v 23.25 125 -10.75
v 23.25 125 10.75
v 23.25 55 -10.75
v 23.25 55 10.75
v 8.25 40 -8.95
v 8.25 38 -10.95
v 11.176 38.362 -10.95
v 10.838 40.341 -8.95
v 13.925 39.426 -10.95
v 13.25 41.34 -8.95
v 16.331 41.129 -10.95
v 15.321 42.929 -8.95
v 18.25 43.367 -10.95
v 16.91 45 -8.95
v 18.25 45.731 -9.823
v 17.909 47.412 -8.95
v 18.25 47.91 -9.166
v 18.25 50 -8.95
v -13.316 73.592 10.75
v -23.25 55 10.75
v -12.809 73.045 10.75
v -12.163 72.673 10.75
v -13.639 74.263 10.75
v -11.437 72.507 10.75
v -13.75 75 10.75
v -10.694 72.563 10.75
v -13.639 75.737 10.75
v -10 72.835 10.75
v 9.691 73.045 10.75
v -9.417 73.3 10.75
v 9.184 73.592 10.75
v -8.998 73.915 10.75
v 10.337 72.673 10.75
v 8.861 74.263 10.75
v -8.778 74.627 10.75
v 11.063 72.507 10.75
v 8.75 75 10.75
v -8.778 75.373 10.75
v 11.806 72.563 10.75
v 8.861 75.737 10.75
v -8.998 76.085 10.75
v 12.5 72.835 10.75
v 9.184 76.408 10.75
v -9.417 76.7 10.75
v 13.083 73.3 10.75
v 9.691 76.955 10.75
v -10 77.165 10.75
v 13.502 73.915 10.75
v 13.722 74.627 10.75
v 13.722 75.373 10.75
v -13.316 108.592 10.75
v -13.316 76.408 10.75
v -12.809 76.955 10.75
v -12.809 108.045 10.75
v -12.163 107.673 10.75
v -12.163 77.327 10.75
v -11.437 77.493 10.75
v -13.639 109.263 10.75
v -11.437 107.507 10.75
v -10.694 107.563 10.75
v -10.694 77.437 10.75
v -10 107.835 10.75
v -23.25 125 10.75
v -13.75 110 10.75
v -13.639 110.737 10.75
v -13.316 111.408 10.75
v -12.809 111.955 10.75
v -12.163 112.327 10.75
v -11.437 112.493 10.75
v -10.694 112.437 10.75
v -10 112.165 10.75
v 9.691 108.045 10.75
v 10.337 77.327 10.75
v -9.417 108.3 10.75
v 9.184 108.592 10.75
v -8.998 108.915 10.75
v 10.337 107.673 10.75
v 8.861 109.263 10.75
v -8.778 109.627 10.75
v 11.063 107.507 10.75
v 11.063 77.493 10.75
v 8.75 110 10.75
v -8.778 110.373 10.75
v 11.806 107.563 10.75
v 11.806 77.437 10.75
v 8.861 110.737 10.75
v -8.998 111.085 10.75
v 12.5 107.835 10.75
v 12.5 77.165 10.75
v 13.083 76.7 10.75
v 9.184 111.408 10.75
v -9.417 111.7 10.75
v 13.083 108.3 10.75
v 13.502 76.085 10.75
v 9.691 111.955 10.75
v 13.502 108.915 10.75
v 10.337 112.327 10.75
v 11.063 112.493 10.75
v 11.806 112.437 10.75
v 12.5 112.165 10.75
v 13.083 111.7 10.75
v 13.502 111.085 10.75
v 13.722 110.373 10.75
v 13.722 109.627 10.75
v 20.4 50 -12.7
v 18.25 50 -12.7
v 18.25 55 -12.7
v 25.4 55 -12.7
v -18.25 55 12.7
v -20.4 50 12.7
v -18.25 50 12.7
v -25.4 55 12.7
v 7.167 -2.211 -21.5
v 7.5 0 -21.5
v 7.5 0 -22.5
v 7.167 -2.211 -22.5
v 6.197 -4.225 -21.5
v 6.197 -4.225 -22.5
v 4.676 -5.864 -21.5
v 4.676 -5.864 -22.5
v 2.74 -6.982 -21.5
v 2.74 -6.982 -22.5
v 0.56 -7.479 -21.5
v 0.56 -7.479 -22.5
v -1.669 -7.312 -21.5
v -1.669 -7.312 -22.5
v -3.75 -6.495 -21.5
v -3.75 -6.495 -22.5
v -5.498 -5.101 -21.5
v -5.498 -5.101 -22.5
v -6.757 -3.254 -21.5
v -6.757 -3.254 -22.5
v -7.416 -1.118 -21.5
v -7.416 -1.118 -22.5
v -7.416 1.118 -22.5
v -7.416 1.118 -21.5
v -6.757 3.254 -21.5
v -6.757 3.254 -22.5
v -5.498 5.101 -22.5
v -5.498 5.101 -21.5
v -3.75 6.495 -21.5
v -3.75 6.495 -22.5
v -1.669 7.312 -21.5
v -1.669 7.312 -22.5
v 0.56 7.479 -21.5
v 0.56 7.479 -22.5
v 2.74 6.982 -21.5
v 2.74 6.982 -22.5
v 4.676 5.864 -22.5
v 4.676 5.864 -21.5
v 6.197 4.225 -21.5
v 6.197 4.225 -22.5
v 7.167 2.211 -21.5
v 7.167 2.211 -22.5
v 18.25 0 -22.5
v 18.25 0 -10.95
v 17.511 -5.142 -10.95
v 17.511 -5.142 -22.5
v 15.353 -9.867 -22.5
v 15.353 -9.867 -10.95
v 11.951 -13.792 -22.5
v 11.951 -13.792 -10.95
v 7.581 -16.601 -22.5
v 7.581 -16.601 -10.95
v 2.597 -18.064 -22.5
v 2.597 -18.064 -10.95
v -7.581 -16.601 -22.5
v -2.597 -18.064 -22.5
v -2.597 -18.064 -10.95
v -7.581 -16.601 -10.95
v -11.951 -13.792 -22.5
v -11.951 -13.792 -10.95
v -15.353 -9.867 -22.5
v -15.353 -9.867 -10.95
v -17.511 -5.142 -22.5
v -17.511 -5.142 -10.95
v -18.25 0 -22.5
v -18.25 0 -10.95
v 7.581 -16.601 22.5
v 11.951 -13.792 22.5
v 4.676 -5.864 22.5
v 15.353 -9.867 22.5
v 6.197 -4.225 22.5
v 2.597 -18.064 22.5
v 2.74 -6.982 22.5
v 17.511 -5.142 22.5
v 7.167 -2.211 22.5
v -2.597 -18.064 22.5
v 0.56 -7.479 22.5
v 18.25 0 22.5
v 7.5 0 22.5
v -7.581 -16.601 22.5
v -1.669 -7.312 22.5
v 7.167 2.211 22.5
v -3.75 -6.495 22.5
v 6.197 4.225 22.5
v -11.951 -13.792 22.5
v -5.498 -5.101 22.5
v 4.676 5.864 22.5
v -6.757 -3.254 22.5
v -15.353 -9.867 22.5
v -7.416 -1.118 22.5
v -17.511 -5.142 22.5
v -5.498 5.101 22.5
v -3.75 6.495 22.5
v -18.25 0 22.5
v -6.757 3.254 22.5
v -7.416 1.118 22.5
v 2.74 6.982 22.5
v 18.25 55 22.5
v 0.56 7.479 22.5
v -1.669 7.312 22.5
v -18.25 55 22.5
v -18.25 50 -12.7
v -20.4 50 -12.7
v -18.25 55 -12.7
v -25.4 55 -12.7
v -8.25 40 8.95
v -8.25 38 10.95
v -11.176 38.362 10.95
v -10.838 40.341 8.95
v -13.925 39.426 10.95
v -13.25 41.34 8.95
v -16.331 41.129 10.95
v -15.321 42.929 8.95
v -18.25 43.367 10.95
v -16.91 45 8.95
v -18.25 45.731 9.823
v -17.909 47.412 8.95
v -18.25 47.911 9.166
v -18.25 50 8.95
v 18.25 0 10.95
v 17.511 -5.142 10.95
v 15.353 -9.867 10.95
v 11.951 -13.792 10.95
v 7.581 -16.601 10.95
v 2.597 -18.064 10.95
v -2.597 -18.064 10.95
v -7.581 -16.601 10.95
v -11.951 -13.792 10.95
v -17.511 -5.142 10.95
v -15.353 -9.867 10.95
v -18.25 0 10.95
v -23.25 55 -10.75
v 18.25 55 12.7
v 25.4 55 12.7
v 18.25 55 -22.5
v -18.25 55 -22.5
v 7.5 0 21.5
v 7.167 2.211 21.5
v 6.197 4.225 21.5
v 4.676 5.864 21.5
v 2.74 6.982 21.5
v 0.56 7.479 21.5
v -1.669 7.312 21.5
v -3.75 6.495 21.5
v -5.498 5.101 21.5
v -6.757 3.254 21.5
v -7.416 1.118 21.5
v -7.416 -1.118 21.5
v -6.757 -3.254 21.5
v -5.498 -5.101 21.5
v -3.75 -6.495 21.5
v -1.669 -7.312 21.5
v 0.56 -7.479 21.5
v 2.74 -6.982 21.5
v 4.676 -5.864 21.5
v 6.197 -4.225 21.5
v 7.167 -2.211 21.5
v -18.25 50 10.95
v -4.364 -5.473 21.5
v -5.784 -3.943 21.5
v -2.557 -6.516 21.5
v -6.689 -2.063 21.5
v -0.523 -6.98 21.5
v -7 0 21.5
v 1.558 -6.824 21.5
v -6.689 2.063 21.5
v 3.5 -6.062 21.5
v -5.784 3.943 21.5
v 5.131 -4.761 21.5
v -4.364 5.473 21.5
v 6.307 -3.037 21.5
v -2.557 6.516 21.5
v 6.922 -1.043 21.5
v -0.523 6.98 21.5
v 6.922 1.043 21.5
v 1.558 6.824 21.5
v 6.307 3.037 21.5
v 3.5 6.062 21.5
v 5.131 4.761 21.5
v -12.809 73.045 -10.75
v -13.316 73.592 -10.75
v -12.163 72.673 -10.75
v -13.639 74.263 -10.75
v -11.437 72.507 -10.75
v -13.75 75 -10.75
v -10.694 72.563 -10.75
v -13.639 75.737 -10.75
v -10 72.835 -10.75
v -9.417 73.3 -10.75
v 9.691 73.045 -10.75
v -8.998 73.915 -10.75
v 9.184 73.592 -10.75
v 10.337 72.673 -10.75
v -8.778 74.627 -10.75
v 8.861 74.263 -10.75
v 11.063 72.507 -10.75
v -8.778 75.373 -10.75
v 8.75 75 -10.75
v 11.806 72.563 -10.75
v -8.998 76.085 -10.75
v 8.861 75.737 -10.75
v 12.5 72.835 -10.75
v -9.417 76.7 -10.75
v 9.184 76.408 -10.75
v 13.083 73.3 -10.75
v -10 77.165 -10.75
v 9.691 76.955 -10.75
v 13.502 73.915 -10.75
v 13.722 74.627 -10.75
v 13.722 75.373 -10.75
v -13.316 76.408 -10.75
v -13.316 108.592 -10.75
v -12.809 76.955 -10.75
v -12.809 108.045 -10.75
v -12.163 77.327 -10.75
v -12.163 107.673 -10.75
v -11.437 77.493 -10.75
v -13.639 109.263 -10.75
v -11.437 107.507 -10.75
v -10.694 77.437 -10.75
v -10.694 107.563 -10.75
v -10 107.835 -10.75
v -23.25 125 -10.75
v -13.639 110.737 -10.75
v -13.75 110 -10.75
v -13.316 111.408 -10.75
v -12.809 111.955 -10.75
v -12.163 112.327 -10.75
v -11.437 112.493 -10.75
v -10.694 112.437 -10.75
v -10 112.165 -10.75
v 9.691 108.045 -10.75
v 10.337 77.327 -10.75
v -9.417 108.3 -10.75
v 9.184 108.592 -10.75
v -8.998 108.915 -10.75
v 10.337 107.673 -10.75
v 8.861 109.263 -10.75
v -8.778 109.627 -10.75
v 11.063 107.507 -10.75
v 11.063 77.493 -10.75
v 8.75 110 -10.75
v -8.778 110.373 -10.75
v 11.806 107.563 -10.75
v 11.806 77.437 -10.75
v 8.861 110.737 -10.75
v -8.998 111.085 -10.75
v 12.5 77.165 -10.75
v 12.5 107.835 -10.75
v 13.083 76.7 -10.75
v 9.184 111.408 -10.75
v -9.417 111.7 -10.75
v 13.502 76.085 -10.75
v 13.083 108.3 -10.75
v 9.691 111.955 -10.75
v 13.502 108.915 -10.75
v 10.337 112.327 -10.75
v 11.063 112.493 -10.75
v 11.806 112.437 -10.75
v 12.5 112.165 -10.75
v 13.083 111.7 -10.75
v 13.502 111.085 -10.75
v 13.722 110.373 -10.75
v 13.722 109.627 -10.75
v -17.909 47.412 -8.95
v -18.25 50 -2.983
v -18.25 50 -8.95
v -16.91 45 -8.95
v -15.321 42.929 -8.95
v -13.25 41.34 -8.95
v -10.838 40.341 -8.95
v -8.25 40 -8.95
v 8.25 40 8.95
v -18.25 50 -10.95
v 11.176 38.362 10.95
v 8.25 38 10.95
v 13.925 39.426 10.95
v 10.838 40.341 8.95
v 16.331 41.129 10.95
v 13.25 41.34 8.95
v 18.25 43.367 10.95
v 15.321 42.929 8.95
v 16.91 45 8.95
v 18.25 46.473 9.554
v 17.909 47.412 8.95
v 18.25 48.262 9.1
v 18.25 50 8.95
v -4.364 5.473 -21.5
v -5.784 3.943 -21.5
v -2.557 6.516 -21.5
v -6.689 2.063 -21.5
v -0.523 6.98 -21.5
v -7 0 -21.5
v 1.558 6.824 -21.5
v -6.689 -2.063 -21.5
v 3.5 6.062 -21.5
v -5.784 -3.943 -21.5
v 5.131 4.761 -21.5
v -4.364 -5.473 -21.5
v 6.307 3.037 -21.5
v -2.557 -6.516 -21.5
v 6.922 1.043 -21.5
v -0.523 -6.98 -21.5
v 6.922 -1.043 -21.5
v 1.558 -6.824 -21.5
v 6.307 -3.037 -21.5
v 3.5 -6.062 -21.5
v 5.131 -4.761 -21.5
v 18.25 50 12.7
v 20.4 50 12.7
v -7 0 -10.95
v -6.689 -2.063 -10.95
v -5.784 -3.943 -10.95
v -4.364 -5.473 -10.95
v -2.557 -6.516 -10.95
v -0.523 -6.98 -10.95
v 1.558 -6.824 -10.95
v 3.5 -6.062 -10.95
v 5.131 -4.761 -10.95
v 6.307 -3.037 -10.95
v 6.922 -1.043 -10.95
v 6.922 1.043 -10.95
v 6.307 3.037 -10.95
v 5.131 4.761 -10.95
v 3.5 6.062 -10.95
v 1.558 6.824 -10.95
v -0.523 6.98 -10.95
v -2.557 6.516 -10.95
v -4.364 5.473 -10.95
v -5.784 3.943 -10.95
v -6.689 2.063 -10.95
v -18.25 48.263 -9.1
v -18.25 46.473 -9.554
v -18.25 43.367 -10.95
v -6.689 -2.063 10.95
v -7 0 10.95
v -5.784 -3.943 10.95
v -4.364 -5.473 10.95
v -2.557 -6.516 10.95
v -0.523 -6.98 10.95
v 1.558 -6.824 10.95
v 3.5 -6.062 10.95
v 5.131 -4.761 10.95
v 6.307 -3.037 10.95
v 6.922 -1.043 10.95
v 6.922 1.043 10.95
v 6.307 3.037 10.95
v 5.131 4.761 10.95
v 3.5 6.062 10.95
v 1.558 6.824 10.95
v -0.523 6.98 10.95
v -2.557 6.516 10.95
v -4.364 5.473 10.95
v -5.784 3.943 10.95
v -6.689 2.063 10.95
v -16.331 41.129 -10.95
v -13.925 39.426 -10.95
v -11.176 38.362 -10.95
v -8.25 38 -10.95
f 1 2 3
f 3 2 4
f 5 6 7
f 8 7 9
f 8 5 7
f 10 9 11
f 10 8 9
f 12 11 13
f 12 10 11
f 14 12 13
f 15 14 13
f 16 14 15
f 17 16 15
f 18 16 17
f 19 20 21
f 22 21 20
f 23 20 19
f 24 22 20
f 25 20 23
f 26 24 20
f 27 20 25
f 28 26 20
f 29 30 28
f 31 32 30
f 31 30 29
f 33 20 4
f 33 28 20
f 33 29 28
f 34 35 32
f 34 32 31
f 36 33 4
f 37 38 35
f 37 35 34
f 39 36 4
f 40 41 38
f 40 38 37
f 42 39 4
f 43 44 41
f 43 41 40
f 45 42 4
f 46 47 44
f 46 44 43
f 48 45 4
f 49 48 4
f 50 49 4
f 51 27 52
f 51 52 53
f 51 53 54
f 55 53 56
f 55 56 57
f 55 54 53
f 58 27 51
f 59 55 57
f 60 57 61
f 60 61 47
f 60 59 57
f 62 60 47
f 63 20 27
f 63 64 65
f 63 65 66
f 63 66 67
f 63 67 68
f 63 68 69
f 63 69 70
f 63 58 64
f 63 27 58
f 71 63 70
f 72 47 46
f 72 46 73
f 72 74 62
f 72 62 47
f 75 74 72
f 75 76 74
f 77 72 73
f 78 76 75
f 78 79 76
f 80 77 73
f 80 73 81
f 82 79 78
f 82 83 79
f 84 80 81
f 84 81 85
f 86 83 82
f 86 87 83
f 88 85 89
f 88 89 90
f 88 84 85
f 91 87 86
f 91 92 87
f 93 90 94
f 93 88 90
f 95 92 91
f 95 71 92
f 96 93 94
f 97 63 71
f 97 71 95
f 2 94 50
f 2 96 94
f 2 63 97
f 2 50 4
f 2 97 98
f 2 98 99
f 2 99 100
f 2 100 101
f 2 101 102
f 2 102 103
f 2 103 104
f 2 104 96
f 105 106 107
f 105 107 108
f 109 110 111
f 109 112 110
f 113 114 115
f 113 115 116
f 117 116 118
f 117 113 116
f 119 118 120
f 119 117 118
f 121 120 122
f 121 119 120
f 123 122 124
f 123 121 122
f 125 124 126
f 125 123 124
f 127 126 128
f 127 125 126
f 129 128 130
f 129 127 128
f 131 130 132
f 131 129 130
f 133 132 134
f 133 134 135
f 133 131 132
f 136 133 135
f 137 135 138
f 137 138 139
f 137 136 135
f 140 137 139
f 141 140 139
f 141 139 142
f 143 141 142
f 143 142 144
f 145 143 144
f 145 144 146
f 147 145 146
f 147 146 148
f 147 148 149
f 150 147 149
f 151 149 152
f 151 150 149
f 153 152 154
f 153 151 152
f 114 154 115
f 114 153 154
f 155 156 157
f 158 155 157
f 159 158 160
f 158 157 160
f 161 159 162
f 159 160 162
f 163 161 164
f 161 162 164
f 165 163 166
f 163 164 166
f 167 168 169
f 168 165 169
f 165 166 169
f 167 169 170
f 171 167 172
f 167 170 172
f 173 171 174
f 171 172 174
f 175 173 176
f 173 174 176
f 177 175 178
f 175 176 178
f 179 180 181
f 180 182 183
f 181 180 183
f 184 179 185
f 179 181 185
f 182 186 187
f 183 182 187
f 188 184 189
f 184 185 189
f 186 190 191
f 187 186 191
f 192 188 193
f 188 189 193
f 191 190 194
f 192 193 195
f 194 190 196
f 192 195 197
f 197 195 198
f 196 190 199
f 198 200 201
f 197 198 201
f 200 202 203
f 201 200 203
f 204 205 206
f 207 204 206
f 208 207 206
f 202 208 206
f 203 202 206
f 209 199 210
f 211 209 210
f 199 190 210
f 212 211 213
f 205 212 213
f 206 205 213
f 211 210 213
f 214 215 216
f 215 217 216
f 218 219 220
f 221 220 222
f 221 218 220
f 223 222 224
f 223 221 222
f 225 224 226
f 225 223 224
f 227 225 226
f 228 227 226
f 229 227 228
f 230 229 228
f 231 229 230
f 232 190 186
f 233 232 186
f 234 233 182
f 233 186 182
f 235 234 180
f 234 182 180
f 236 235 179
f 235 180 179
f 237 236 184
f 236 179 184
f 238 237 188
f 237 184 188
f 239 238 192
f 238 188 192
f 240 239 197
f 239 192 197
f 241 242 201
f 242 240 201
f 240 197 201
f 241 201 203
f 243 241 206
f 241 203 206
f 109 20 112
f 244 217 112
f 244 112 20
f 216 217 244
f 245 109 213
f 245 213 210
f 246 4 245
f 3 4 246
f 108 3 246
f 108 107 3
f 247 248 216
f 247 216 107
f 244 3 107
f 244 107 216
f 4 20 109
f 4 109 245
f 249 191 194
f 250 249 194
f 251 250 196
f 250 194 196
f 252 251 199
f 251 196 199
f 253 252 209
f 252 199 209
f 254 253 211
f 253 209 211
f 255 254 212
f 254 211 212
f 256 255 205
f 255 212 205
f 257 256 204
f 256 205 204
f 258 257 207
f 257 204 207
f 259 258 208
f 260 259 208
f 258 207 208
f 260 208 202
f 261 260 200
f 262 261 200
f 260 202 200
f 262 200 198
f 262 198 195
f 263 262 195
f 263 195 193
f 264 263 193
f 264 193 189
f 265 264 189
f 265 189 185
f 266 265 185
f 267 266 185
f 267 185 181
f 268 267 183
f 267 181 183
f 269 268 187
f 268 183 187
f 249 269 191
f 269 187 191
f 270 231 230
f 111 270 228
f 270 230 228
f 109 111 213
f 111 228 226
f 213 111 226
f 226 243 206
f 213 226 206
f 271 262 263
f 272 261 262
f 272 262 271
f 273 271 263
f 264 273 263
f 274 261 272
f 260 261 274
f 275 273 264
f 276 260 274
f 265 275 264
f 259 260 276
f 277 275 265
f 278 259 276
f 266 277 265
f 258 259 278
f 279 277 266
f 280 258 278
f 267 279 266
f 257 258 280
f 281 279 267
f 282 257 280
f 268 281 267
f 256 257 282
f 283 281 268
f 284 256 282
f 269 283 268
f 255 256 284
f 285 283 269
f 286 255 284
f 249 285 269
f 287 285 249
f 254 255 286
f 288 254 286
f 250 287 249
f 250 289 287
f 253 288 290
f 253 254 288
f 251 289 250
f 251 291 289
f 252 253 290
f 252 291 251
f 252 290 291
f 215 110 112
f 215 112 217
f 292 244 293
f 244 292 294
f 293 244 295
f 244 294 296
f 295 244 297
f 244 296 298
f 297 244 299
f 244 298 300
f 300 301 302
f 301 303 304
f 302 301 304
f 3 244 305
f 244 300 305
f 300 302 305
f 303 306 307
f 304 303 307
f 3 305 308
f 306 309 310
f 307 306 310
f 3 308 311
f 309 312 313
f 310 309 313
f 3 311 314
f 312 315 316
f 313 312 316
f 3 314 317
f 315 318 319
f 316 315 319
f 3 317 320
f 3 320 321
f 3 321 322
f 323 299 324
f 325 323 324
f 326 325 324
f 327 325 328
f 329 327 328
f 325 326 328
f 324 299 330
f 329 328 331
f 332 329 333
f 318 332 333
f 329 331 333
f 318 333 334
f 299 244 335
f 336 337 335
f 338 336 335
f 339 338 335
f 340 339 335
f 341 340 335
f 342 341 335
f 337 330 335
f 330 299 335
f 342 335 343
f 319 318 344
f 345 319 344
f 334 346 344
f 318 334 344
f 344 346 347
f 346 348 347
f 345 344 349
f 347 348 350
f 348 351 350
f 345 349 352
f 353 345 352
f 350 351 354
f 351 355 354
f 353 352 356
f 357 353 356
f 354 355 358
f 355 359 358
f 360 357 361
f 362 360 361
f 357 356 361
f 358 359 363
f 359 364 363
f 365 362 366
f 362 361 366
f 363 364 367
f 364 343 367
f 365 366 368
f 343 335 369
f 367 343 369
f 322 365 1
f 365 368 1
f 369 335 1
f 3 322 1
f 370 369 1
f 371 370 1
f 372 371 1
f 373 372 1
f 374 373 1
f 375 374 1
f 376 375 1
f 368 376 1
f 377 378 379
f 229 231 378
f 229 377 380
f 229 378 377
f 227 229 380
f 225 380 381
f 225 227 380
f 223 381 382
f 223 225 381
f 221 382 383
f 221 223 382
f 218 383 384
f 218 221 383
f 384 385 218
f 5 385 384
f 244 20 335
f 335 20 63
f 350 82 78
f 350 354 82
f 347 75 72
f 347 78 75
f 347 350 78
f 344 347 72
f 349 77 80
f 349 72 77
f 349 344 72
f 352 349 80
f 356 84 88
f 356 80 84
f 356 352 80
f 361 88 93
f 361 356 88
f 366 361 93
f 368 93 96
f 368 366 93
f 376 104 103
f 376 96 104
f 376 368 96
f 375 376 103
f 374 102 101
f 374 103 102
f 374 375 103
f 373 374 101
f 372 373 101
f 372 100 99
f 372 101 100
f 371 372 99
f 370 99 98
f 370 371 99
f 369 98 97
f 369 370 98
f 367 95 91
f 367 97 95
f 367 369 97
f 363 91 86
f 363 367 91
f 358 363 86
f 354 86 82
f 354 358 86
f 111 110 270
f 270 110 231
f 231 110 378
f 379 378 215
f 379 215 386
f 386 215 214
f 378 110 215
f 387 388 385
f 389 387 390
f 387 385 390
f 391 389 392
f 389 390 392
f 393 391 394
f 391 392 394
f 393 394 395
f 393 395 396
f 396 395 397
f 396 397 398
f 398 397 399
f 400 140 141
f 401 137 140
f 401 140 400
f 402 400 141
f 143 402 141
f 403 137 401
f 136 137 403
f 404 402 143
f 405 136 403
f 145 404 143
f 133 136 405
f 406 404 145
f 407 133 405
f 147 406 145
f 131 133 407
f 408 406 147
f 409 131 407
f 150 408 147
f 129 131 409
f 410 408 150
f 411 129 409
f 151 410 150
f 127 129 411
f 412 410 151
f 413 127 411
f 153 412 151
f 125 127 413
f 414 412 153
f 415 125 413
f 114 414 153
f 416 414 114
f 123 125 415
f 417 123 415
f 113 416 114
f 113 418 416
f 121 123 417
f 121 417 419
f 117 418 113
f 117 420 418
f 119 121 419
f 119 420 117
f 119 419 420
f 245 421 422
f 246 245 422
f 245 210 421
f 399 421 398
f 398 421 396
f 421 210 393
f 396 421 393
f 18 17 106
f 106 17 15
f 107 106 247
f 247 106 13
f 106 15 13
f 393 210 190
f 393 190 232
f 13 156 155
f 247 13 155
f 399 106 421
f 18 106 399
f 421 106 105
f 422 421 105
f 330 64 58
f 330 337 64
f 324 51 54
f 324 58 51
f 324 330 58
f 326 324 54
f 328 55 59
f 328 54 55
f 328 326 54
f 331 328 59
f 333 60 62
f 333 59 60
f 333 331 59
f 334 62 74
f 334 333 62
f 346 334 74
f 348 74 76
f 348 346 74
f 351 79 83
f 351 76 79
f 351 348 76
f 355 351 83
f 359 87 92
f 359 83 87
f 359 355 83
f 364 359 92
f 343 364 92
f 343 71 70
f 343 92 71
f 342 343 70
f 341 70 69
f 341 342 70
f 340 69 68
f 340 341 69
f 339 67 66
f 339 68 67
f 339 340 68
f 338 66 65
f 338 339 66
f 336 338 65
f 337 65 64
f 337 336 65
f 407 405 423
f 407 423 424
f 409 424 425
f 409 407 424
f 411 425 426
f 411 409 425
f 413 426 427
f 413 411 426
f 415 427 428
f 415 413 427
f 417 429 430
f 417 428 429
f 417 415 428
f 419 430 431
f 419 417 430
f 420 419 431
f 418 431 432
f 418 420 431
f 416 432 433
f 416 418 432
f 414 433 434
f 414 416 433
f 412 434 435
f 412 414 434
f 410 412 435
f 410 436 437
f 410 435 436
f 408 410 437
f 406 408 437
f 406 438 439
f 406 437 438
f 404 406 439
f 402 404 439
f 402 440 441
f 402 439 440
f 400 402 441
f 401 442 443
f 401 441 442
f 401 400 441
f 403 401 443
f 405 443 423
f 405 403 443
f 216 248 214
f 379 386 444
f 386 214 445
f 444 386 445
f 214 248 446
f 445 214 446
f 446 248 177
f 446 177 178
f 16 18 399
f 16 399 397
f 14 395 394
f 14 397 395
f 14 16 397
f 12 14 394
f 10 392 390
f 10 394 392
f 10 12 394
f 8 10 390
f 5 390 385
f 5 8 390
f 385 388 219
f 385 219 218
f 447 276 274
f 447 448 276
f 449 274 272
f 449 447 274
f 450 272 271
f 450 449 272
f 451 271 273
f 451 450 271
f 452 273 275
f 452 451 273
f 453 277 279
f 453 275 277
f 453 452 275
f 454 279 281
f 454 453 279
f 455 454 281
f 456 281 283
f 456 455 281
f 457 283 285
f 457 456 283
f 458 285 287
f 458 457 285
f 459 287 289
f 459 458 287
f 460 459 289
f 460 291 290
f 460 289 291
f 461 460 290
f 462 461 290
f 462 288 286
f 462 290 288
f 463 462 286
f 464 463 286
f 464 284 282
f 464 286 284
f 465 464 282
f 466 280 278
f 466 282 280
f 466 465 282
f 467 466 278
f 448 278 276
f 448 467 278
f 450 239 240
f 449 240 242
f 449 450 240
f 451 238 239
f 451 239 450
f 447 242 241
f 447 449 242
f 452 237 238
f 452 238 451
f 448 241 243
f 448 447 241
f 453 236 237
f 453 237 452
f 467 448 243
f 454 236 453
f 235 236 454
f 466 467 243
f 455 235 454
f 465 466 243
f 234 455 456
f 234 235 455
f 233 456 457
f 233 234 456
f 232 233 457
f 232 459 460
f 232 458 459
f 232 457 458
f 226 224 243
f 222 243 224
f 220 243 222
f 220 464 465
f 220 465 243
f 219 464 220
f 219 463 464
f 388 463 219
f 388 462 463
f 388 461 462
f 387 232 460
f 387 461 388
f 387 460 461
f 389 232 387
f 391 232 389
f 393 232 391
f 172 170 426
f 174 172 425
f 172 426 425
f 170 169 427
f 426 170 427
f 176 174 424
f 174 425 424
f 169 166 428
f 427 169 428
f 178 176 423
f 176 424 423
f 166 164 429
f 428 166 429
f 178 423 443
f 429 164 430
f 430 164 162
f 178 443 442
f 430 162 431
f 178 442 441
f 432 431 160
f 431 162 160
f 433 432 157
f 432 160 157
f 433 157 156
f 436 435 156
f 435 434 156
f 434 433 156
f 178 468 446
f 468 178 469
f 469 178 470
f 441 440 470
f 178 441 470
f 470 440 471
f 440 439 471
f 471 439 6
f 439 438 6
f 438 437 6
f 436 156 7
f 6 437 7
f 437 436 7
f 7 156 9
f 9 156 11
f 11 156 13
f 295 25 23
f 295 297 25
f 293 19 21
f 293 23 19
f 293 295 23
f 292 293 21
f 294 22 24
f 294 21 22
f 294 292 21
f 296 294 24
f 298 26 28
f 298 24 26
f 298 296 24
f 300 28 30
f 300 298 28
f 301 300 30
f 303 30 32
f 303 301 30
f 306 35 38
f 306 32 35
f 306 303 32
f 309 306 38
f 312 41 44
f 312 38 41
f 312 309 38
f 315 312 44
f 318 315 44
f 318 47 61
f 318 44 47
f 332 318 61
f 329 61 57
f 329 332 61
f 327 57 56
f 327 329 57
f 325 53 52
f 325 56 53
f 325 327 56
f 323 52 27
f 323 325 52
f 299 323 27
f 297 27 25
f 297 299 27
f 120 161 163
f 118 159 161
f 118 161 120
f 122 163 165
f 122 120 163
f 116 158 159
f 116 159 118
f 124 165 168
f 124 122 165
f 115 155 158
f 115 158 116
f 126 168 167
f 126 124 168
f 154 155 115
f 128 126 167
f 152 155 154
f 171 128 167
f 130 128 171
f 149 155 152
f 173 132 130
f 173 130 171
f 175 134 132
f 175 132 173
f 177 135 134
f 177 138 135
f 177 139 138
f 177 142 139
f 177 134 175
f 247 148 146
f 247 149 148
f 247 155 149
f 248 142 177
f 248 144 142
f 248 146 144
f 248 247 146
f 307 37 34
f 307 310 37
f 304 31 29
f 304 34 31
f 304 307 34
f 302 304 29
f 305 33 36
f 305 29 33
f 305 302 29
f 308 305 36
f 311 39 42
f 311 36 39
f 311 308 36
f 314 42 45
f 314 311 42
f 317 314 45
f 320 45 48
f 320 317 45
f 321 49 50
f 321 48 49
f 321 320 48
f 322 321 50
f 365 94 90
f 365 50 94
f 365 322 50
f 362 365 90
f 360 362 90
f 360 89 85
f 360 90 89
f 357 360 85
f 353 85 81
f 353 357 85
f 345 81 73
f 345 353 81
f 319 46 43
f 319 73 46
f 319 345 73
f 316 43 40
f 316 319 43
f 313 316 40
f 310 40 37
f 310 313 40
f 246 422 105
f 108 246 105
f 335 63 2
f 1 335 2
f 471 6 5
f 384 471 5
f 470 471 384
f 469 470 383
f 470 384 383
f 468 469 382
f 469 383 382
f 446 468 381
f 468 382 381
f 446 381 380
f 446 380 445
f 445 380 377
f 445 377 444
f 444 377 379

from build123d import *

# Parameters (mm, degrees)
SKETCH1_R           = 7
SKETCH1_R_2         = 2.5
BOSS_EXTRUDE1_DEPTH = 22.5
SKETCH2_W           = 21.9
SKETCH2_H           = 63.25
CUT_EXTRUDE1_DEPTH  = 136.25346576
SKETCH3_R           = 7.5
CUT_EXTRUDE2_DEPTH  = 1
CUT_EXTRUDE3_START  = -1
SKETCH4_R           = 7.5
CUT_EXTRUDE3_DEPTH  = 1
SKETCH5_W           = 9.8
SKETCH5_H           = 70
CUT_EXTRUDE4_DEPTH  = 136.25346576
CUT_EXTRUDE5_DEPTH  = 135.872393395
CUT_EXTRUDE6_REACH  = 148.858
SKETCH8_W           = 46.5
SKETCH8_H           = 1.95
SKETCH9_W           = 50.8
SKETCH9_H           = 25.4
BOSS_EXTRUDE2_DEPTH = 5
FILLET1_R           = 10
CHAMFER1_SIZE       = 5
CHAMFER2_SIZE       = 2


# Some blends are built 0.0001 mm under size
with BuildPart() as part:
    # Sketch1 → Boss-Extrude1 (new, symmetric)
    with BuildSketch(Plane.XY):
        with BuildLine():
            Line((-23.25, 0), (-23.25, 125))
            Line((-23.25, 125), (23.25, 125))
            Line((23.25, 125), (23.25, 0))
            ThreePointArc((23.25, 0), (0, -23.25), (-23.25, 0))
        make_face()
        with Locations(Location((0, 0, 0), (0, 0, 180))):
            Circle(SKETCH1_R, mode=Mode.SUBTRACT)
        with Locations(Location((-11.25, 110, 0), (0, 0, 180))):
            Circle(SKETCH1_R_2, mode=Mode.SUBTRACT)
        with Locations(Location((11.25, 110, 0), (0, 0, 180))):
            Circle(SKETCH1_R_2, mode=Mode.SUBTRACT)
        with Locations(Location((11.25, 75, 0), (0, 0, 180))):
            Circle(SKETCH1_R_2, mode=Mode.SUBTRACT)
        with Locations(Location((-11.25, 75, 0), (0, 0, 180))):
            Circle(SKETCH1_R_2, mode=Mode.SUBTRACT)
    extrude(amount=BOSS_EXTRUDE1_DEPTH, both=True)

    # Sketch2 → Cut-Extrude1 (cut, through all)
    with BuildSketch(Plane(origin=(23.25, 0, 0), x_dir=(0, 0, -1), z_dir=(1, 0, 0))):
        with Locations((0, 8.375)):
            Rectangle(SKETCH2_W, SKETCH2_H)
    extrude(amount=-CUT_EXTRUDE1_DEPTH, mode=Mode.SUBTRACT)

    # Sketch3 → Cut-Extrude2 (cut)
    with BuildSketch(Plane.XY.offset(22.5)):
        Circle(SKETCH3_R)
    extrude(amount=-CUT_EXTRUDE2_DEPTH, mode=Mode.SUBTRACT)

    # Sketch4 → Cut-Extrude3 (cut)
    with BuildSketch(Plane(origin=(0, 0, -22.5), x_dir=(-1, 0, 0), z_dir=(0, 0, -1)).offset(CUT_EXTRUDE3_START)):
        with Locations(Location((0, 0, 0), (0, 0, 180))):
            Circle(SKETCH4_R)
    extrude(amount=CUT_EXTRUDE3_DEPTH, mode=Mode.SUBTRACT)

    # Sketch5 → Cut-Extrude4 (cut, through all)
    with BuildSketch(Plane(origin=(23.25, 0, 0), x_dir=(0, 0, -1), z_dir=(1, 0, 0))):
        with Locations((-17.6, 90)):
            Rectangle(SKETCH5_W, SKETCH5_H)
        with Locations((17.6, 90)):
            Rectangle(SKETCH5_W, SKETCH5_H)
    extrude(amount=-CUT_EXTRUDE4_DEPTH, mode=Mode.SUBTRACT)

    # Sketch6 → Cut-Extrude5 (cut, through all)
    with BuildSketch(Plane.XY.offset(22.5)):
        with BuildLine():
            Line((-18.25, 0), (-18.25, 55))
            Line((-18.25, 55), (-23.25, 55))
            Line((-23.25, 55), (-23.25, -23.25))
            Line((-23.25, -23.25), (23.25, -23.25))
            Line((23.25, -23.25), (23.25, 55))
            Line((23.25, 55), (18.25, 55))
            Line((18.25, 55), (18.25, 0))
            ThreePointArc((18.25, 0), (0, -18.25), (-18.25, 0))
        make_face()
    extrude(amount=-CUT_EXTRUDE5_DEPTH, mode=Mode.SUBTRACT)

    # Cut-Extrude6: up to this face of the body (flat: up to its plane)
    cut_extrude6_end = Plane(part.part.faces().sort_by_distance((0, 55, -17.6))[0])
    # Sketch8 → Cut-Extrude6 (cut, up to the picked face)
    with BuildSketch(Plane(origin=(0, 125, 0), x_dir=(1, 0, 0), z_dir=(0, 1, 0)), mode=Mode.PRIVATE) as cut_extrude6_sk1:
        with Locations((0, 11.725)):
            Rectangle(SKETCH8_W, SKETCH8_H)
    cut_extrude6_tool1 = split(extrude(cut_extrude6_sk1.sketch, amount=-CUT_EXTRUDE6_REACH, mode=Mode.PRIVATE), bisect_by=cut_extrude6_end, keep=Keep.BOTH, mode=Mode.PRIVATE)
    # Sketch8 → Cut-Extrude6 (cut, up to the picked face)
    with BuildSketch(Plane(origin=(0, 125, 0), x_dir=(1, 0, 0), z_dir=(0, 1, 0)), mode=Mode.PRIVATE) as cut_extrude6_sk2:
        with Locations((0, -11.725)):
            Rectangle(SKETCH8_W, SKETCH8_H)
    cut_extrude6_tool2 = split(extrude(cut_extrude6_sk2.sketch, amount=-CUT_EXTRUDE6_REACH, mode=Mode.PRIVATE), bisect_by=cut_extrude6_end, keep=Keep.BOTH, mode=Mode.PRIVATE)
    add(cut_extrude6_tool1.solids().sort_by(Axis((0, 125, -11.725), (0, -1, 0)))[0], mode=Mode.SUBTRACT)
    add(cut_extrude6_tool2.solids().sort_by(Axis((0, 125, 11.725), (0, -1, 0)))[0], mode=Mode.SUBTRACT)

    # Sketch9 → Boss-Extrude2 (add)
    with BuildSketch(Plane(origin=(0, 55, 0), x_dir=(1, 0, 0), z_dir=(0, 1, 0))):
        Rectangle(SKETCH9_W, SKETCH9_H)
    extrude(amount=-BOSS_EXTRUDE2_DEPTH)

    # Fillet1
    fillet1_edges = [part.edges().sort_by_distance(p)[0] for p in [
        (18.25, 40, 0),
        (-18.25, 40, 0),
    ]]
    fillet(fillet1_edges, radius=FILLET1_R - 0.0001)  # a hair under: the kernel refuses the full size

    # Chamfer1
    chamfer1_edges = [part.edges().sort_by_distance(p)[0] for p in [
        (-25.4, 50, 0),
        (25.4, 50, 0),
    ]]
    chamfer(chamfer1_edges, length=CHAMFER1_SIZE - 0.0001)  # a hair under: the kernel refuses the full size

    # Chamfer2
    # the kernel refuses this chamfer: 2 mm, written as the material it adds along each edge
    with BuildSketch(Plane(origin=(8.2501, 40, -10.95), x_dir=(0, -0.9996219169112968, -0.02749587661058651), z_dir=(-1, 0, 0))) as chamfer2_piece_1:
        Polygon((CHAMFER2_SIZE * 0.999621916911, CHAMFER2_SIZE * 0.0274958766106), (-CHAMFER2_SIZE * 0.0274958766106, CHAMFER2_SIZE * 0.999621916911), (0, 0), align=None)
    extrude(amount=16.5002)
    with BuildSketch(Plane(origin=(8.2501, 40, 10.95), x_dir=(0, -0.9996219169112968, 0.02749587661058651), z_dir=(-1, 0, 0))) as chamfer2_piece_2:
        Polygon((CHAMFER2_SIZE * 0.999621916911, -CHAMFER2_SIZE * 0.0274958766106), (-CHAMFER2_SIZE * 0.0274958766106, -CHAMFER2_SIZE * 0.999621916911), (0, 0), align=None)
    extrude(amount=16.5002)
    with BuildSketch(Plane(origin=(8.2501, 49.9999, 10.95), x_dir=(0, -1, 0), z_dir=(-1, 0, 0))) as chamfer2_piece_3_section:
        Polygon((9.9999 + CHAMFER2_SIZE, 0), (9.9999, -CHAMFER2_SIZE), (9.9999, 0), align=None)
    chamfer2_piece_3 = revolve(axis=Axis((8.2501, 49.9999, 10.95), (0, 0, 1)), revolution_arc=119.48144917, mode=Mode.PRIVATE)
    chamfer2_piece_3 = split(chamfer2_piece_3, bisect_by=Plane(origin=(18.25, 39.233435125, 10.852733076), z_dir=(-1, 0, 0)), keep=Keep.TOP, mode=Mode.PRIVATE)
    chamfer2_piece_3 = split(chamfer2_piece_3, bisect_by=Plane(origin=(10.698789492, 50, 10.852733076), z_dir=(0, -1, 0)), keep=Keep.TOP, mode=Mode.PRIVATE)
    add(chamfer2_piece_3)
    with BuildSketch(Plane(origin=(8.2501, 49.9999, -10.95), x_dir=(0, -1, 0), z_dir=(-1, 0, 0))) as chamfer2_piece_4_section:
        Polygon((9.9999 + CHAMFER2_SIZE, 0), (9.9999, CHAMFER2_SIZE), (9.9999, 0), align=None)
    chamfer2_piece_4 = revolve(axis=Axis((8.2501, 49.9999, -10.95), (0, 0, 1)), revolution_arc=119.48144917, mode=Mode.PRIVATE)
    chamfer2_piece_4 = split(chamfer2_piece_4, bisect_by=Plane(origin=(18.25, 39.233435125, -10.852733076), z_dir=(-1, 0, 0)), keep=Keep.TOP, mode=Mode.PRIVATE)
    chamfer2_piece_4 = split(chamfer2_piece_4, bisect_by=Plane(origin=(10.698789492, 50, -10.852733076), z_dir=(0, -1, 0)), keep=Keep.TOP, mode=Mode.PRIVATE)
    add(chamfer2_piece_4)
    with BuildSketch(Plane(origin=(-8.2501, 49.9999, -10.95), x_dir=(0, -1, 0), z_dir=(1, 0, 0))) as chamfer2_piece_5_section:
        Polygon((9.9999 + CHAMFER2_SIZE, 0), (9.9999, -CHAMFER2_SIZE), (9.9999, 0), align=None)
    chamfer2_piece_5 = revolve(axis=Axis((-8.2501, 49.9999, -10.95), (0, 0, -1)), revolution_arc=119.48144917, mode=Mode.PRIVATE)
    chamfer2_piece_5 = split(chamfer2_piece_5, bisect_by=Plane(origin=(-10.698789492, 50, -10.852733076), z_dir=(0, -1, 0)), keep=Keep.TOP, mode=Mode.PRIVATE)
    chamfer2_piece_5 = split(chamfer2_piece_5, bisect_by=Plane(origin=(-18.25, 39.233435125, -10.852733076), z_dir=(1, 0, 0)), keep=Keep.TOP, mode=Mode.PRIVATE)
    add(chamfer2_piece_5)
    with BuildSketch(Plane(origin=(-8.2501, 49.9999, 10.95), x_dir=(0, -1, 0), z_dir=(1, 0, 0))) as chamfer2_piece_6_section:
        Polygon((9.9999 + CHAMFER2_SIZE, 0), (9.9999, CHAMFER2_SIZE), (9.9999, 0), align=None)
    chamfer2_piece_6 = revolve(axis=Axis((-8.2501, 49.9999, 10.95), (0, 0, -1)), revolution_arc=119.48144917, mode=Mode.PRIVATE)
    chamfer2_piece_6 = split(chamfer2_piece_6, bisect_by=Plane(origin=(-10.698789492, 50, 10.852733076), z_dir=(0, -1, 0)), keep=Keep.TOP, mode=Mode.PRIVATE)
    chamfer2_piece_6 = split(chamfer2_piece_6, bisect_by=Plane(origin=(-18.25, 39.233435125, 10.852733076), z_dir=(1, 0, 0)), keep=Keep.TOP, mode=Mode.PRIVATE)
    add(chamfer2_piece_6)


solid = part.part
